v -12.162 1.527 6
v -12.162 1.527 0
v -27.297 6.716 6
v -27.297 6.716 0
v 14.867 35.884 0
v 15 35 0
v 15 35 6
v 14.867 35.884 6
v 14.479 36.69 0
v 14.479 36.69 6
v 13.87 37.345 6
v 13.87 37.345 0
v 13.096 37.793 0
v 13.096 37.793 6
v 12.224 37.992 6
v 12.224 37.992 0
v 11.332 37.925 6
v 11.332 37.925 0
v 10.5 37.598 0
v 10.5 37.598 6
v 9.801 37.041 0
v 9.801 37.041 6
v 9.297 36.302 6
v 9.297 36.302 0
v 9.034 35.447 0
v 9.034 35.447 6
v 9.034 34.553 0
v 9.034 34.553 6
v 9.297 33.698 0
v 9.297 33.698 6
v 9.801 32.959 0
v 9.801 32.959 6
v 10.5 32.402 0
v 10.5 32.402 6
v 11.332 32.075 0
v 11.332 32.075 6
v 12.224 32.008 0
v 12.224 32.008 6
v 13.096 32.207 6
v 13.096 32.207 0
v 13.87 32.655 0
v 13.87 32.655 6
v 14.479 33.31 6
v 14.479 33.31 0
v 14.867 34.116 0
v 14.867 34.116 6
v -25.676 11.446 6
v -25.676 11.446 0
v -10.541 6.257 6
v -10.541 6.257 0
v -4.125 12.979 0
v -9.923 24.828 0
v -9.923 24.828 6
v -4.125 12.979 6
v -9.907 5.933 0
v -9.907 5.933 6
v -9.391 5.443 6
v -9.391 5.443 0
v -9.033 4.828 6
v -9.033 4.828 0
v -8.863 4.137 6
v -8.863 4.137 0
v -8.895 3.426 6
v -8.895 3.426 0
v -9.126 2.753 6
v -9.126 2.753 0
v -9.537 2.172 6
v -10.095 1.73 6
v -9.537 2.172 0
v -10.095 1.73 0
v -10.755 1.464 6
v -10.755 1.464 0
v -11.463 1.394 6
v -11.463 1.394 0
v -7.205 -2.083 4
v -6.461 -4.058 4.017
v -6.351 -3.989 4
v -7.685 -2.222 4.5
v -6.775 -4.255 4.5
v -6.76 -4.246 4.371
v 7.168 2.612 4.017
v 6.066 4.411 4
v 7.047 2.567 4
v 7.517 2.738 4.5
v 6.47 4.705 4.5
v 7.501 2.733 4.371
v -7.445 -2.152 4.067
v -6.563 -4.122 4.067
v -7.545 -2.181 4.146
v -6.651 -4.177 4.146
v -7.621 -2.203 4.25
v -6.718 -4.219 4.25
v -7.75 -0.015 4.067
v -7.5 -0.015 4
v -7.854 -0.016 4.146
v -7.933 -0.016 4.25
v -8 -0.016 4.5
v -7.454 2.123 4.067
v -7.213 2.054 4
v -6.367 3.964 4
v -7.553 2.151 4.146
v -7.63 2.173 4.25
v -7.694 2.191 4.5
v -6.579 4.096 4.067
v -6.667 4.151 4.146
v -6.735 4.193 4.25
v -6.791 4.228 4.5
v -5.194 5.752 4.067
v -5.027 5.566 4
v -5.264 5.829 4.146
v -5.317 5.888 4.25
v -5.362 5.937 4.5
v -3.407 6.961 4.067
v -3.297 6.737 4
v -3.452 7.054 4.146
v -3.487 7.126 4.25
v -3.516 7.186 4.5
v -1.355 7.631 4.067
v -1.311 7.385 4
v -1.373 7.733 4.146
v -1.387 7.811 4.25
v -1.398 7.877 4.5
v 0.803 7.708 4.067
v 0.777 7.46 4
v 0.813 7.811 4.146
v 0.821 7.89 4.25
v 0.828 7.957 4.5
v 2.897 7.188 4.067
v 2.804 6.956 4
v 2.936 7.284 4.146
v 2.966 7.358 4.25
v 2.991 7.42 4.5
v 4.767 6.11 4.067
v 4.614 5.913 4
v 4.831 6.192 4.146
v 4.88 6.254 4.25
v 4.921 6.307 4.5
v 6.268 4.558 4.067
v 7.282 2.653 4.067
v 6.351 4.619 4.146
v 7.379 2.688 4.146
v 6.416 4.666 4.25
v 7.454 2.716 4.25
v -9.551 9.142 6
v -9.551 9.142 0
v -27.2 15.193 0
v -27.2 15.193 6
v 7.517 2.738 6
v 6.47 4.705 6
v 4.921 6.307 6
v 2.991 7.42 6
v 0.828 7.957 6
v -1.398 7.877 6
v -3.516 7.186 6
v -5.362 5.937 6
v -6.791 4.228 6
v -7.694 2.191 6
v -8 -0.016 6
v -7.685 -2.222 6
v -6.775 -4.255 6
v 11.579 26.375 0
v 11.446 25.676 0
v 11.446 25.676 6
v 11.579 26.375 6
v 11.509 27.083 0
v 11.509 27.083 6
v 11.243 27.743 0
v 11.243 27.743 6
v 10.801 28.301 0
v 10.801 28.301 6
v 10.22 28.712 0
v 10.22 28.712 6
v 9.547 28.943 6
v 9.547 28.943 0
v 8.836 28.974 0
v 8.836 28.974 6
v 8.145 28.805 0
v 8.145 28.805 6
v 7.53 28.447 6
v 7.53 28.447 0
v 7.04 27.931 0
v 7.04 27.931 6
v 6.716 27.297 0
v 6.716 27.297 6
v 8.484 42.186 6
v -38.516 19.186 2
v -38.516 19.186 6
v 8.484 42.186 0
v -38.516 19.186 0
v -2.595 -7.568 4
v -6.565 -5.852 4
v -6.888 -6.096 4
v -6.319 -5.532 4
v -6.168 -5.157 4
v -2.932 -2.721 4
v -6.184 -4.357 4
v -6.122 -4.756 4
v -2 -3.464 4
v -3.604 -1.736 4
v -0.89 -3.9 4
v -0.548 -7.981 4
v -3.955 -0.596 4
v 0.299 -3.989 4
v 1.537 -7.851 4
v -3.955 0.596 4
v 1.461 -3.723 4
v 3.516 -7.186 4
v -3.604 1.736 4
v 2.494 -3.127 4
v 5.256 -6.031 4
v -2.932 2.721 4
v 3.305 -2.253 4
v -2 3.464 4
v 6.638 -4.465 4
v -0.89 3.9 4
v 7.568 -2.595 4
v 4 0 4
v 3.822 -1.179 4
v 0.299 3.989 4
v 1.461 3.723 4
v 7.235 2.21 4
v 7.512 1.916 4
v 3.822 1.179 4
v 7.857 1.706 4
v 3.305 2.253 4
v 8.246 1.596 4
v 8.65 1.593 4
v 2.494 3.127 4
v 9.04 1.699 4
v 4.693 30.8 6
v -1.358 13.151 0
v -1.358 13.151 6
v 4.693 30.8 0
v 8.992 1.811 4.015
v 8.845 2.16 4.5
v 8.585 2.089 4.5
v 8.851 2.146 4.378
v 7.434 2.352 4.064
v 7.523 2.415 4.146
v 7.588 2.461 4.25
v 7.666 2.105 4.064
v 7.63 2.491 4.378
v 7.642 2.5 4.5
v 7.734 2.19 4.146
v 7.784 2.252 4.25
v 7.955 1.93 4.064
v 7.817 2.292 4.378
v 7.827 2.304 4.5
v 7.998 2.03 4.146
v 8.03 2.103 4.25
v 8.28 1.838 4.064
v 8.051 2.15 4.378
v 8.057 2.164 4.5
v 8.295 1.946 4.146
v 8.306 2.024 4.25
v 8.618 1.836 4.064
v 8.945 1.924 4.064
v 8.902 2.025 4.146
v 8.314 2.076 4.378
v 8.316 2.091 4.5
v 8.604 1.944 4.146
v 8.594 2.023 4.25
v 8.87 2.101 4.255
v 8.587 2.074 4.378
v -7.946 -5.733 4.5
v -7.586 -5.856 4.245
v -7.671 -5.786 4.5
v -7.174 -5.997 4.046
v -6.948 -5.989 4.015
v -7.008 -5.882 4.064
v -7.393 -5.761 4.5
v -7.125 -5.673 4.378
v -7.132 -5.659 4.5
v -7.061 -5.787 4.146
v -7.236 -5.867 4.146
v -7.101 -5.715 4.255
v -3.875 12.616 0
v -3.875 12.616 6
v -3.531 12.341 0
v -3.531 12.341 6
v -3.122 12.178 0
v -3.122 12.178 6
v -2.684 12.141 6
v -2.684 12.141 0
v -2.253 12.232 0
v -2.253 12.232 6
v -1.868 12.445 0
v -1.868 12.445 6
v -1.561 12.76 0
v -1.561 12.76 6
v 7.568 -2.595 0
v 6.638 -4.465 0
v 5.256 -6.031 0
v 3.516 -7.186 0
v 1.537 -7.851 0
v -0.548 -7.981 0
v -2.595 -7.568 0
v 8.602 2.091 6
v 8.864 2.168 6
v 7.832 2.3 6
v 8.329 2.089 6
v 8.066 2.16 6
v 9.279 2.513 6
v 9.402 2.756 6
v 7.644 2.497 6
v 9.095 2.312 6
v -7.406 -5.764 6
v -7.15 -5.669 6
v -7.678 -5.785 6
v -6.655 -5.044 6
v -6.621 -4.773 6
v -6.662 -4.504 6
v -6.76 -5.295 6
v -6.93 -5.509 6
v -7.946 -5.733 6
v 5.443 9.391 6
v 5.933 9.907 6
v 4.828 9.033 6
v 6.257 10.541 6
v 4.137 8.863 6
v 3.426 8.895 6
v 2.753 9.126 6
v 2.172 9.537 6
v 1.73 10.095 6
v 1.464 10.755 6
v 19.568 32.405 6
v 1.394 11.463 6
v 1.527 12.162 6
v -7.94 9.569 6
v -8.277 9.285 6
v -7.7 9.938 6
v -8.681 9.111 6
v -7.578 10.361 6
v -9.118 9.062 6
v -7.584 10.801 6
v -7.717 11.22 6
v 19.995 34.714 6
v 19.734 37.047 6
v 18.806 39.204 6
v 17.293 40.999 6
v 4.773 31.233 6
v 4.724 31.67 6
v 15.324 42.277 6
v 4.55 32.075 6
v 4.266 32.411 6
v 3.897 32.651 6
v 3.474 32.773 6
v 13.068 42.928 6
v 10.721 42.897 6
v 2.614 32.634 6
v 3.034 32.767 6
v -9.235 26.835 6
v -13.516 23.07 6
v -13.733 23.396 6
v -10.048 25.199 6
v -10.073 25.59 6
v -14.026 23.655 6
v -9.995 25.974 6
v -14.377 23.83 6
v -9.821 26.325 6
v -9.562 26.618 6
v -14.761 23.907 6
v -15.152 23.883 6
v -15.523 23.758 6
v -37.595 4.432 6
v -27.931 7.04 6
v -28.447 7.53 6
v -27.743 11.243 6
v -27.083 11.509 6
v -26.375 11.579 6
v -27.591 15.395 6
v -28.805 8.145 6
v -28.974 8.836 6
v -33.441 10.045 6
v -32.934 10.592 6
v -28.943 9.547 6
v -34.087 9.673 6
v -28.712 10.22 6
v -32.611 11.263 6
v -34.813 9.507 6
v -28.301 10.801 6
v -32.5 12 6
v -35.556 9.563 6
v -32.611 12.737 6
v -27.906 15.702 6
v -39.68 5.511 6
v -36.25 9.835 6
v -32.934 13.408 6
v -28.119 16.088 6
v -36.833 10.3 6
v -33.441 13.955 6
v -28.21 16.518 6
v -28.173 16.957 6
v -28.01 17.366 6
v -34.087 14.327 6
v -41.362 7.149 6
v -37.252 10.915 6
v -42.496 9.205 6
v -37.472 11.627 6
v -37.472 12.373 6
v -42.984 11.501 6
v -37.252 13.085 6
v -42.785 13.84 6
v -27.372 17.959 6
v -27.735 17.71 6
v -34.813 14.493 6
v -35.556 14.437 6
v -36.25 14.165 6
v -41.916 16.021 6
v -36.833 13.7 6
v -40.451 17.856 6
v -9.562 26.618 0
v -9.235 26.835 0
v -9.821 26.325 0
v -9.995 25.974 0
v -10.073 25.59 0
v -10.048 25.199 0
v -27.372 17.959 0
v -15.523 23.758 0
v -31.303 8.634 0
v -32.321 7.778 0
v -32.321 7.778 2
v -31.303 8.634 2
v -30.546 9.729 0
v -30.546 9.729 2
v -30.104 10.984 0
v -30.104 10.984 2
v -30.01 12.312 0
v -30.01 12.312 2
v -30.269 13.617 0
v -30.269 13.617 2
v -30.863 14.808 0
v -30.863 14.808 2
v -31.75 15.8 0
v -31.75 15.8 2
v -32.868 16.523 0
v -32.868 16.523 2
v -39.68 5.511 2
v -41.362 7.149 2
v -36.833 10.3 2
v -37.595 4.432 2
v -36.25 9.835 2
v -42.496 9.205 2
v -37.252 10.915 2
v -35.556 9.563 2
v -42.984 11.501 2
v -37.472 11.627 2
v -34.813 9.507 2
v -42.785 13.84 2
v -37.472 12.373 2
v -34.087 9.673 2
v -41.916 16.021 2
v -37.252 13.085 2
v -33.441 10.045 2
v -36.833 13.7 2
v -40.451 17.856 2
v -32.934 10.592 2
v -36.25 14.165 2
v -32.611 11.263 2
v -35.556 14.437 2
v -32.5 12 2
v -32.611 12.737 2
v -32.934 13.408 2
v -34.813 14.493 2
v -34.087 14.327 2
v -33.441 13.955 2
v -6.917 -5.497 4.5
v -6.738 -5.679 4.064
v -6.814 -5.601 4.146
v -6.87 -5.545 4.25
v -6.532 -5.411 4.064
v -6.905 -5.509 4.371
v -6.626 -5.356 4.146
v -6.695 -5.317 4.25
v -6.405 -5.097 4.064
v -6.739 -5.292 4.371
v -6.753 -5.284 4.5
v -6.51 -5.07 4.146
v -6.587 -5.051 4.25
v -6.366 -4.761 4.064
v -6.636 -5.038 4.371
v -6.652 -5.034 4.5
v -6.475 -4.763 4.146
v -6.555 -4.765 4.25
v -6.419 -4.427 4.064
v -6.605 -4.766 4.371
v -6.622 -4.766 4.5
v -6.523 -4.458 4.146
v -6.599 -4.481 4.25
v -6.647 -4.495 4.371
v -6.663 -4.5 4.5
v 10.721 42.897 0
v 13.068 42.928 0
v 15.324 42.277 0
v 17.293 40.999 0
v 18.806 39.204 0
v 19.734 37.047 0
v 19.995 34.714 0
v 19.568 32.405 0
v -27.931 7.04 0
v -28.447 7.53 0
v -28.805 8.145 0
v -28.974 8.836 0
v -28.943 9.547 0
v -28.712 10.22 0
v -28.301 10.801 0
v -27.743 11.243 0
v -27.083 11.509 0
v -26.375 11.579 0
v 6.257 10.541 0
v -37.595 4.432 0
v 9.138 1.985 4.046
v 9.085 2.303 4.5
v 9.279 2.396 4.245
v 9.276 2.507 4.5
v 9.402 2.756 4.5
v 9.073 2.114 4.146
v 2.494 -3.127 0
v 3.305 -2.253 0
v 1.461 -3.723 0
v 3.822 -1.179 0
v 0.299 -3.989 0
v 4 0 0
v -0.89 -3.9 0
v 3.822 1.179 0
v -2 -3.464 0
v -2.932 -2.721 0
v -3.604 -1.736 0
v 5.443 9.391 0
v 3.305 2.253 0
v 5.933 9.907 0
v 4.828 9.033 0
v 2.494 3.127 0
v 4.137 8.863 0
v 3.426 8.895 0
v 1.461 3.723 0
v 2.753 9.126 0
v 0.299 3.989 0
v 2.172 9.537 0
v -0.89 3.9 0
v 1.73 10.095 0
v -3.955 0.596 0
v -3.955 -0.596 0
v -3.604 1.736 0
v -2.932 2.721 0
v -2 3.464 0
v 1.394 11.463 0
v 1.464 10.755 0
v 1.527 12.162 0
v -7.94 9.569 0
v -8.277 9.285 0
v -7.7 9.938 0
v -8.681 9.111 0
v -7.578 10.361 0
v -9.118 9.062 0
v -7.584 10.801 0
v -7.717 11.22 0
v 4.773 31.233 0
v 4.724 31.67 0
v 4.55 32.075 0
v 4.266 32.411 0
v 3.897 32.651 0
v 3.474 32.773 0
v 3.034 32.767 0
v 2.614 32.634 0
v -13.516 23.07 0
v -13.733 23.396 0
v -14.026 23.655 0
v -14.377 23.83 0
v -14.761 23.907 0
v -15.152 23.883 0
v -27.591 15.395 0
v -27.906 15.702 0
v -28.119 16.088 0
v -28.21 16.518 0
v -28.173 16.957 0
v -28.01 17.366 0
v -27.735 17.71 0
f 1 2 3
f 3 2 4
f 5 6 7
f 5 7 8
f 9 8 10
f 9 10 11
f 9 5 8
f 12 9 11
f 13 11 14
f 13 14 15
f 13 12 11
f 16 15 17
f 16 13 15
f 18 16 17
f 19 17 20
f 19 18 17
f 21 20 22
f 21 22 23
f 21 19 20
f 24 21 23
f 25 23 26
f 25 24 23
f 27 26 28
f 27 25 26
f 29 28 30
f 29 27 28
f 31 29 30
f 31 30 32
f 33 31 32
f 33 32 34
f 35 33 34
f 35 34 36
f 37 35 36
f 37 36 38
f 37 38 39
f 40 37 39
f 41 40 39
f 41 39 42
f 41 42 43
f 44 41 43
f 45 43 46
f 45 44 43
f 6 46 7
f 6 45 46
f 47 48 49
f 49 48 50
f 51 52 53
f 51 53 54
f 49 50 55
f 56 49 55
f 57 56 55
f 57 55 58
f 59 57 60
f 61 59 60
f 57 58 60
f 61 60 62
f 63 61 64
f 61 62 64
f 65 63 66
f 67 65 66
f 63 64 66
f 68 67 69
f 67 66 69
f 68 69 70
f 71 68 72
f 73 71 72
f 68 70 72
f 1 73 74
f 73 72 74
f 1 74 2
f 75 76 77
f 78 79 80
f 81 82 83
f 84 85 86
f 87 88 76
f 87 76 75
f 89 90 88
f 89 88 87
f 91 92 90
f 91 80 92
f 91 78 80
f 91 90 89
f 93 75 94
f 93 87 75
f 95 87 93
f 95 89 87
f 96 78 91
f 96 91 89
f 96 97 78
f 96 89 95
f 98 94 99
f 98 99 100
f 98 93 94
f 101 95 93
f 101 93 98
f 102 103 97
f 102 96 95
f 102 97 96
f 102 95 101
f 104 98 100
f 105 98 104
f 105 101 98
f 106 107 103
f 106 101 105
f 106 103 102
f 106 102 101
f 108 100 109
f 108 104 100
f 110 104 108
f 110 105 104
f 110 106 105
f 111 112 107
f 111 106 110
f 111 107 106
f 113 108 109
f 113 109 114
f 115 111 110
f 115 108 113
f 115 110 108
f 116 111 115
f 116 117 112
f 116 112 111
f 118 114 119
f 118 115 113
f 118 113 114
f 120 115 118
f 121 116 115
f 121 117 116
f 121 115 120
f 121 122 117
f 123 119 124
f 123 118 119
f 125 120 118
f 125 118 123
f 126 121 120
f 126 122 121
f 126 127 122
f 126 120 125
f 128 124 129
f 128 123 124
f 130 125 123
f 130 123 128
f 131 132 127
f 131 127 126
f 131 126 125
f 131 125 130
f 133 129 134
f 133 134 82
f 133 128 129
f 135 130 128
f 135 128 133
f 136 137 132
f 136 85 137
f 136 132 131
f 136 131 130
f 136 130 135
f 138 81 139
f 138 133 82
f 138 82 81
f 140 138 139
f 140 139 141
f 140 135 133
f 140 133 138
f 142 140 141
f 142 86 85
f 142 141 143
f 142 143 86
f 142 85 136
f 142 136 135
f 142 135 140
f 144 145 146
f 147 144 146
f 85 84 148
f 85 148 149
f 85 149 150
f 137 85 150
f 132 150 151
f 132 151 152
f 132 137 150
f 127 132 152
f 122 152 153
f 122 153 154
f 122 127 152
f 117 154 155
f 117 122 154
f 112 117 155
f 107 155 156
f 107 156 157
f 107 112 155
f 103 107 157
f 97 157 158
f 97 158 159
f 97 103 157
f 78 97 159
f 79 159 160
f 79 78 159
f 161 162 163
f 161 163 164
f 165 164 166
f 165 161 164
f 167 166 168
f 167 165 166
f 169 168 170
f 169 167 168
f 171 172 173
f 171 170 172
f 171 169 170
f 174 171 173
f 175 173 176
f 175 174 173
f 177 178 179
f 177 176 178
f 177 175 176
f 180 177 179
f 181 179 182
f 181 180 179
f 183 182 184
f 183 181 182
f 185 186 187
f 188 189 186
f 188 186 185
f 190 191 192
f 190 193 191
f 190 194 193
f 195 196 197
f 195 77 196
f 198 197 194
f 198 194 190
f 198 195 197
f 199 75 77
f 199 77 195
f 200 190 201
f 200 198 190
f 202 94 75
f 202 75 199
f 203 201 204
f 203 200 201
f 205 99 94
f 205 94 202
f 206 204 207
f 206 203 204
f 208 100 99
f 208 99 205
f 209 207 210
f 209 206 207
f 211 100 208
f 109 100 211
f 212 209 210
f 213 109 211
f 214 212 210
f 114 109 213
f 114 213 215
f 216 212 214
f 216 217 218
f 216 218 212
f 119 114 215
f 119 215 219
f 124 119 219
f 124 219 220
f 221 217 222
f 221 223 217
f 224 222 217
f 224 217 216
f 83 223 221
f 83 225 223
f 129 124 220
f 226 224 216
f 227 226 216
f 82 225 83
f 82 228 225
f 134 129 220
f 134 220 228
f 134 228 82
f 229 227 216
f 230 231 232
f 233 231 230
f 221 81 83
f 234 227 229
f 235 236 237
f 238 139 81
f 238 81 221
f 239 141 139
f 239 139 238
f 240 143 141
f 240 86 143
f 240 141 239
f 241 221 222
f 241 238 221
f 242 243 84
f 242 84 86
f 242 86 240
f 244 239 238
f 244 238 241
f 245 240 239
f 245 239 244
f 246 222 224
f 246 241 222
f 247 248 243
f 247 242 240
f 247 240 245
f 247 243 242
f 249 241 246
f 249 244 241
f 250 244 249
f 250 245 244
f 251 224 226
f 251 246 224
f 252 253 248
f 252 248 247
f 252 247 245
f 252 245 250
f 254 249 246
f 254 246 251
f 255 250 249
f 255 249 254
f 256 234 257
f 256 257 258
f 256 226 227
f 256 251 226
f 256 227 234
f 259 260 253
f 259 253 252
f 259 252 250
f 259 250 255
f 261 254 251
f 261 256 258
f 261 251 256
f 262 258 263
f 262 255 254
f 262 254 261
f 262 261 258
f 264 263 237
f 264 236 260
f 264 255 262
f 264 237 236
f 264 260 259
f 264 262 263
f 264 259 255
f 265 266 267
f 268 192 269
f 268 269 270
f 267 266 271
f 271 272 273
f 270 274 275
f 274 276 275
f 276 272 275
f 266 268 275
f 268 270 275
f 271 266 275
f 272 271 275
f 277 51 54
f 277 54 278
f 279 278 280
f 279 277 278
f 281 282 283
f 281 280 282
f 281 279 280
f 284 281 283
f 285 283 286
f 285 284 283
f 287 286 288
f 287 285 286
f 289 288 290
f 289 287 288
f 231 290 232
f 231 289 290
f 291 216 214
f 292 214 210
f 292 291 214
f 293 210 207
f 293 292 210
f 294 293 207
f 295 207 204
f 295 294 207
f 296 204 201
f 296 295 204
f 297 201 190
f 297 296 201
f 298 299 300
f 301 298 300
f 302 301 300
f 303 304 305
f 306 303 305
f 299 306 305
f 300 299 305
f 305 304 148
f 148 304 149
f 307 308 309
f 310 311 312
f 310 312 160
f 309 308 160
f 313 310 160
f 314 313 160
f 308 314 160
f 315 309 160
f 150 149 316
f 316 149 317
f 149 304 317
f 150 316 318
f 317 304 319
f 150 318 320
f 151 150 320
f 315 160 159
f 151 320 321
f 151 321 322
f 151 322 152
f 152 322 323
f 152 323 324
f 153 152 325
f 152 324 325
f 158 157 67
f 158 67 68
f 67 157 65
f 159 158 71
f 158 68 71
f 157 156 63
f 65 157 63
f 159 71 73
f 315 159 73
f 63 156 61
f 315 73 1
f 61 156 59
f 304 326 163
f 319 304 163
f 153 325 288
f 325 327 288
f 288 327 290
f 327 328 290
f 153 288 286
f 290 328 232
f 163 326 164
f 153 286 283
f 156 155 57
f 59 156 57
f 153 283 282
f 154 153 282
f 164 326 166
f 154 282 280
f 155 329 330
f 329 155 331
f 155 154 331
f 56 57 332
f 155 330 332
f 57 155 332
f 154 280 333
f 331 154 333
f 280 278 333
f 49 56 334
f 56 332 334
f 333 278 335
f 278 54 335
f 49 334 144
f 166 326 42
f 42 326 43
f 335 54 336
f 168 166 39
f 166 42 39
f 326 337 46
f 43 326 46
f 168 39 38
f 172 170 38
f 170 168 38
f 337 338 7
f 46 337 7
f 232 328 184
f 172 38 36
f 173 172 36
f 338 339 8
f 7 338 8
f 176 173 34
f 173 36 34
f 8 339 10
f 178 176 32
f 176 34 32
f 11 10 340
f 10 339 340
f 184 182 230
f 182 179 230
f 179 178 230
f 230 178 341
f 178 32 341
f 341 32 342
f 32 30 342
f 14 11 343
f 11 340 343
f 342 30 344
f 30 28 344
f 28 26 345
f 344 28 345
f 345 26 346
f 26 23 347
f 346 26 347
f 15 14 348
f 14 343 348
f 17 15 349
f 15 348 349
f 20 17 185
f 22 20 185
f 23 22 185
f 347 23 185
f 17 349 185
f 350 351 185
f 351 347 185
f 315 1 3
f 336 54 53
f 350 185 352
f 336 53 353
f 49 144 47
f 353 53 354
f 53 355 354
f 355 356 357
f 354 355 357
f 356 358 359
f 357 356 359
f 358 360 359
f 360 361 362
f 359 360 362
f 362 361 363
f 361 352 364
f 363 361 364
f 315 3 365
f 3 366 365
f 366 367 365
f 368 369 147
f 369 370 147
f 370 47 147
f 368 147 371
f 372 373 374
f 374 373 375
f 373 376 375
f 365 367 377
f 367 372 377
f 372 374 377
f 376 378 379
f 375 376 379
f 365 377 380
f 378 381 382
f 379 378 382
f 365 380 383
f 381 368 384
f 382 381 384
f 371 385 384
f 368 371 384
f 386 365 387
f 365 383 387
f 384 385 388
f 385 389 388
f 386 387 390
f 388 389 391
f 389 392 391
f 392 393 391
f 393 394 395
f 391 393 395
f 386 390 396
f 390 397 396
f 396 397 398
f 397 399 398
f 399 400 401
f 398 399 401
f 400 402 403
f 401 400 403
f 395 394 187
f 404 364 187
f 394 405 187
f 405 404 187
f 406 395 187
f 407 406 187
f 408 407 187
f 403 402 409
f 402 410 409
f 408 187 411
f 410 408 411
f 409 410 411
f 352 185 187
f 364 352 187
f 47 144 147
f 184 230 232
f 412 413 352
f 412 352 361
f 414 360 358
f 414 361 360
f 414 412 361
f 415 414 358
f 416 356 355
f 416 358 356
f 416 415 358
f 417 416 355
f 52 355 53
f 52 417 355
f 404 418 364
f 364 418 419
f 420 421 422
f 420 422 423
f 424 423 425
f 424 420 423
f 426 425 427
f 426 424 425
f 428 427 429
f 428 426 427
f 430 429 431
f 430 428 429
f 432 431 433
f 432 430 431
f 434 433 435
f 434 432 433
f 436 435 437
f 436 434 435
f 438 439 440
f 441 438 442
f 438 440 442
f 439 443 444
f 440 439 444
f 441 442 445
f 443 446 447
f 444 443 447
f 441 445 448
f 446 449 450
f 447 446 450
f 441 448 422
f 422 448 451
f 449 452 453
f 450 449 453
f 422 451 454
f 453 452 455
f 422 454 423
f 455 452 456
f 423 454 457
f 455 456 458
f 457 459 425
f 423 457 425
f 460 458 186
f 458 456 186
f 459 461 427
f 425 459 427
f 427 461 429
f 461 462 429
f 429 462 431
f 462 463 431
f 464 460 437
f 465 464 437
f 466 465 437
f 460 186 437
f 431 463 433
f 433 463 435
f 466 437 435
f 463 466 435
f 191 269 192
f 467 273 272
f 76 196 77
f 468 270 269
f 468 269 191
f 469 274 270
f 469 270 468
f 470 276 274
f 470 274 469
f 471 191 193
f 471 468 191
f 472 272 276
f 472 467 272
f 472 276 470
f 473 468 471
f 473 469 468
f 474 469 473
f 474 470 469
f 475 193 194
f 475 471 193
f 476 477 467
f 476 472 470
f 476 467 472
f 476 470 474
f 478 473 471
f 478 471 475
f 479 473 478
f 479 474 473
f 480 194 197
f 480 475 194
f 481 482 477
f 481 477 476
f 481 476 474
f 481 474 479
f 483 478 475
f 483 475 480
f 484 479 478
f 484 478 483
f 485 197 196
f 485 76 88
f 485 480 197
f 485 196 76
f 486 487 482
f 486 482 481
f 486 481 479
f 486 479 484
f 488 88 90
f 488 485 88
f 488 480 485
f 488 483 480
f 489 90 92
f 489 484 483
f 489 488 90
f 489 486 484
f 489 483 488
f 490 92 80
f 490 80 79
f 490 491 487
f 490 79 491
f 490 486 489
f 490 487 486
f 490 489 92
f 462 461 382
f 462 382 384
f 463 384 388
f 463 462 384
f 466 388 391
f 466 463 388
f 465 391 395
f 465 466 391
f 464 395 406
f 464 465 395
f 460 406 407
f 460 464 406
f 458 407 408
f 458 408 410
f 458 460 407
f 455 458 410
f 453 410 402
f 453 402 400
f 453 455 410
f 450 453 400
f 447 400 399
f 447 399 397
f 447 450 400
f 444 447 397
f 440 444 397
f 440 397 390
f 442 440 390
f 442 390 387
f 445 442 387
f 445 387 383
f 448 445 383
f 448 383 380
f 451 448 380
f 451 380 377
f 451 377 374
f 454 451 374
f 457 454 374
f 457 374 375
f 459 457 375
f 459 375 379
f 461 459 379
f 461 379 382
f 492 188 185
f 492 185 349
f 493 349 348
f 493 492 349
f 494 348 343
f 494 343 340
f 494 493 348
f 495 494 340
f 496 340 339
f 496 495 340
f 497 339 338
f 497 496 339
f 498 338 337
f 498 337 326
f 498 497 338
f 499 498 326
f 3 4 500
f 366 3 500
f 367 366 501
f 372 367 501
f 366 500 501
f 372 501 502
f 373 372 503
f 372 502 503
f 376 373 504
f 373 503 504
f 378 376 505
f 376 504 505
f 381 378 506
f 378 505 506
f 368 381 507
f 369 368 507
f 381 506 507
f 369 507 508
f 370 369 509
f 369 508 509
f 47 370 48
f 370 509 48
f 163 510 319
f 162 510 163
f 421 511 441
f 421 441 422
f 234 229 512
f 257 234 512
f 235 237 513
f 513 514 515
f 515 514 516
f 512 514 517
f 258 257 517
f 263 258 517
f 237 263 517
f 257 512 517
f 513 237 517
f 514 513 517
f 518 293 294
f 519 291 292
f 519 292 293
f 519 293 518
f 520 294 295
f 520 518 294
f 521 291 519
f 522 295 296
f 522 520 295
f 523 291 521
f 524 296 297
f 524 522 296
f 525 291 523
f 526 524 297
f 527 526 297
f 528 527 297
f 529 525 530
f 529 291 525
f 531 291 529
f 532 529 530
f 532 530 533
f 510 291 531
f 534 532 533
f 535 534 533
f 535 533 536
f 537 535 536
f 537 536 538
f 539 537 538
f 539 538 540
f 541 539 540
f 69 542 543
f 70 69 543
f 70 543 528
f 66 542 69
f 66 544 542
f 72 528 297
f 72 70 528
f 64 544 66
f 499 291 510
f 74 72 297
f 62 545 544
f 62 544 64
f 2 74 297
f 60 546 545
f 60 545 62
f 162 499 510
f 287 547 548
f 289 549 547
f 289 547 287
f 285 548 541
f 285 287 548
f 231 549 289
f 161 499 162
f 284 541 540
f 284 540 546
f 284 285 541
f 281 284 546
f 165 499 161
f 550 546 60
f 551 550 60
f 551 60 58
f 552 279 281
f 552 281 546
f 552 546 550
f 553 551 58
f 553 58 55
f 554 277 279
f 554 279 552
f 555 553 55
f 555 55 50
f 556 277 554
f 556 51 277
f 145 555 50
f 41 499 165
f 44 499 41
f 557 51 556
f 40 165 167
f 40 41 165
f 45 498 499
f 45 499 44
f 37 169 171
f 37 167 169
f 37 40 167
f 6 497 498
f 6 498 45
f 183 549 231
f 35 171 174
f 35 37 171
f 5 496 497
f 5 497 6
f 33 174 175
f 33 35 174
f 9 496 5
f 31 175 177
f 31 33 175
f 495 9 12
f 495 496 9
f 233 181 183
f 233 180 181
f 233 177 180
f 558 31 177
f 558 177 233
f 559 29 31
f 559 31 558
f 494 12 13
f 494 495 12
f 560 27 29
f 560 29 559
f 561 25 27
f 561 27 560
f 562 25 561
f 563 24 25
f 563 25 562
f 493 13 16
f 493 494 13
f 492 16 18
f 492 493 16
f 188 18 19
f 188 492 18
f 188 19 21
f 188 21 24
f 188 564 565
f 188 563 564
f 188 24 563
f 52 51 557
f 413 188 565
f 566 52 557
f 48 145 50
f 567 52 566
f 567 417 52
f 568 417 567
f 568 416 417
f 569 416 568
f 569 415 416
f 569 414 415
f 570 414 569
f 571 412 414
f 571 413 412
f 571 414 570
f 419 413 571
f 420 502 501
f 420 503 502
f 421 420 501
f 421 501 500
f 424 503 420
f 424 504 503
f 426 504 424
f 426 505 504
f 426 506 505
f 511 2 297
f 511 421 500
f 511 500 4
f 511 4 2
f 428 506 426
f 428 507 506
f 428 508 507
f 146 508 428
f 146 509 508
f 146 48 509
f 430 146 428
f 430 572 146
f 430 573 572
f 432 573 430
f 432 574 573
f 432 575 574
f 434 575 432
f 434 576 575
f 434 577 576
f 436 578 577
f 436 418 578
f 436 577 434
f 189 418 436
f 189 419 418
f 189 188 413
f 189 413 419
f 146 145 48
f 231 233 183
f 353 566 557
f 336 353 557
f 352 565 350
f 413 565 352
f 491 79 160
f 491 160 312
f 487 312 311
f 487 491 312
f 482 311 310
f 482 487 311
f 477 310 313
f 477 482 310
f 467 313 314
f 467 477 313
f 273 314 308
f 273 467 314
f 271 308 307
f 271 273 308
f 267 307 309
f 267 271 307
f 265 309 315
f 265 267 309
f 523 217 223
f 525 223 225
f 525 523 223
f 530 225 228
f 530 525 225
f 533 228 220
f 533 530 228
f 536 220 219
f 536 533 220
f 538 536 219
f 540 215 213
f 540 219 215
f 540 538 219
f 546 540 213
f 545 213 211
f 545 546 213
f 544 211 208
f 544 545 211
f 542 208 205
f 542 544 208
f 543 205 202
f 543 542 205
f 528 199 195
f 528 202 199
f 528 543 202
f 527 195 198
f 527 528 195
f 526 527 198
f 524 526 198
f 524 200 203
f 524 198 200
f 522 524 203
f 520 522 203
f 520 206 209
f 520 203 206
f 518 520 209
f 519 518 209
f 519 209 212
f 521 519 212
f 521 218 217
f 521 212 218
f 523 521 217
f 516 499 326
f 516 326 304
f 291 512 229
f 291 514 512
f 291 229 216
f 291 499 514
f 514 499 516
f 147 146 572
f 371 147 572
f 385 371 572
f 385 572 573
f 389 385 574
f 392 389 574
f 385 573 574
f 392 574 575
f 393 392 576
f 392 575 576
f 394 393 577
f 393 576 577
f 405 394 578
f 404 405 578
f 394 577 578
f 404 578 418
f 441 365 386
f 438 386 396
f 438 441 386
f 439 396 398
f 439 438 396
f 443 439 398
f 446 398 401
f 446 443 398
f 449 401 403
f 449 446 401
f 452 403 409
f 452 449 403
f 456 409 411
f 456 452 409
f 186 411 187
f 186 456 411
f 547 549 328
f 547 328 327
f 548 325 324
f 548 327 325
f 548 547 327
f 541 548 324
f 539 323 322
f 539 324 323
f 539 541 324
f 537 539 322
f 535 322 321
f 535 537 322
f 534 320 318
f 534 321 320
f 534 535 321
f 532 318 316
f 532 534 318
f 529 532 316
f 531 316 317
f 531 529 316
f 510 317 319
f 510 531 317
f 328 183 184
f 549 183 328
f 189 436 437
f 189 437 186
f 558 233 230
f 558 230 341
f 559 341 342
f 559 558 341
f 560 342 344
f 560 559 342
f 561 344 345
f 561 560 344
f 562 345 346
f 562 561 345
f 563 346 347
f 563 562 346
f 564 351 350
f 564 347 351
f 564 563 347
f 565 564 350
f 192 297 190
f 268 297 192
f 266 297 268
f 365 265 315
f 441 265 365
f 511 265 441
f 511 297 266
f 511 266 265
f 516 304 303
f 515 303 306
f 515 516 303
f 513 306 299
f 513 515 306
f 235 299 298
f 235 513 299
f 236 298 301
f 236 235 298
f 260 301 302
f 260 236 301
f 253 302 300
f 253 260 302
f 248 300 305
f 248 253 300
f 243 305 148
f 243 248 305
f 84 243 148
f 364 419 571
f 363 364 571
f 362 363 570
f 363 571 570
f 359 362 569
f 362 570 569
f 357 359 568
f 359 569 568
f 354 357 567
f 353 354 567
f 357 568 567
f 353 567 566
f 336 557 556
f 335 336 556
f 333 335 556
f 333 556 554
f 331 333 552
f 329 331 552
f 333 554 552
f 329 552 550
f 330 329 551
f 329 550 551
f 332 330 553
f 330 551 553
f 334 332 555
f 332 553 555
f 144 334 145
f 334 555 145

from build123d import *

# Parameters (mm, degrees)
SKETCH1_R               = 2.5
SKETCH1_R_2             = 4
SKETCH1_R_3             = 3
BOSS_EXTRUDE1_DEPTH     = 6
CUT_EXTRUDE1_DEPTH      = 62.10646447
CUT_EXTRUDE1_DEPTH_BACK = 62.10646447
CUT_EXTRUDE2_START      = -2
SKETCH4_R               = 8
CUT_EXTRUDE2_DEPTH      = 2
FILLET1_START           = 4
FILLET1_DEPTH           = 2
FILLET2_R               = 0.5
CUT_EXTRUDE3_DEPTH      = 2


with BuildPart() as part:
    # Sketch1 → Boss-Extrude1 (new body)
    with BuildSketch(Plane.XY):
        with BuildLine():
            Line((19.567567568, 32.405405405), (7.567567568, -2.594594595))
            ThreePointArc((7.567567568, -2.594594595), (3.516422912, -7.185733776), (-2.594594595, -7.567567568))
            Line((-2.594594595, -7.567567568), (-37.594594595, 4.432432432))
            ThreePointArc((-37.594594595, 4.432432432), (-42.984429152, 11.50111011), (-38.516422912, 19.185733776))
            Line((-38.516422912, 19.185733776), (8.483577088, 42.185733776))
            ThreePointArc((8.483577088, 42.185733776), (17.293075573, 40.998612422), (19.567567568, 32.405405405))
        make_face()
        with Locations((-35, 12)):
            Circle(SKETCH1_R, mode=Mode.SUBTRACT)
        Circle(SKETCH1_R_2, mode=Mode.SUBTRACT)
        with Locations((12, 35)):
            Circle(SKETCH1_R_3, mode=Mode.SUBTRACT)
    extrude(amount=BOSS_EXTRUDE1_DEPTH)

    # Sketch2 → Cut-Extrude1 (cut, two sides: drawn at the far end of the back side and taken through both)
    with BuildSketch(Plane.XY.offset(6).offset(-CUT_EXTRUDE1_DEPTH_BACK)):
        with BuildLine():
            Line((-27.3724879, 17.959246424), (-15.522864255, 23.75799842))
            ThreePointArc((-15.522864255, 23.75799842), (-14.377048473, 23.829592256), (-13.516209876, 23.070002633))
            Line((-13.516209876, 23.070002633), (-7.71745788, 11.220378988))
            ThreePointArc((-7.71745788, 11.220378988), (-7.940043134, 9.568598022), (-9.551269449, 9.142130773))
            Line((-9.551269449, 9.142130773), (-27.199645091, 15.193002422))
            ThreePointArc((-27.199645091, 15.193002422), (-28.21023907, 16.518379486), (-27.3724879, 17.959246424))
        make_face()
        with BuildLine():
            Line((-25.675675676, 11.445945946), (-10.540540541, 6.256756757))
            ThreePointArc((-10.540540541, 6.256756757), (-8.986486486, 3.081081081), (-12.162162162, 1.527027027))
            Line((-12.162162162, 1.527027027), (-27.297297297, 6.716216216))
            ThreePointArc((-27.297297297, 6.716216216), (-28.851351351, 9.891891892), (-25.675675676, 11.445945946))
        make_face()
        with BuildLine():
            Line((-9.923342988, 24.828214089), (-4.124590991, 12.978590444))
            ThreePointArc((-4.124590991, 12.978590444), (-2.683724054, 12.140839274), (-1.358346989, 13.151433254))
            Line((-1.358346989, 13.151433254), (4.692524659, 30.799808895))
            ThreePointArc((4.692524659, 30.799808895), (4.26605741, 32.41103521), (2.614276444, 32.633620464))
            Line((2.614276444, 32.633620464), (-9.235347201, 26.834868468))
            ThreePointArc((-9.235347201, 26.834868468), (-9.994936824, 25.974029871), (-9.923342988, 24.828214089))
        make_face()
        with BuildLine():
            Line((6.716216216, 27.297297297), (1.527027027, 12.162162162))
            ThreePointArc((1.527027027, 12.162162162), (3.081081081, 8.986486486), (6.256756757, 10.540540541))
            Line((6.256756757, 10.540540541), (11.445945946, 25.675675676))
            ThreePointArc((11.445945946, 25.675675676), (9.891891892, 28.851351351), (6.716216216, 27.297297297))
        make_face()
    extrude(amount=CUT_EXTRUDE1_DEPTH + CUT_EXTRUDE1_DEPTH_BACK, mode=Mode.SUBTRACT)

    # Sketch4 → Cut-Extrude2 (cut)
    with BuildSketch(Plane.XY.offset(6).offset(CUT_EXTRUDE2_START)):
        Circle(SKETCH4_R)
    extrude(amount=CUT_EXTRUDE2_DEPTH, mode=Mode.SUBTRACT)

    # Fillet1: read off the stored shape, not the designer's step
    # Fillet1 outline → Fillet1 (cut)
    with BuildSketch(Plane.XY.offset(FILLET1_START)):
        with BuildLine():
            ThreePointArc((9.402223, 2.75648375), (8.465816464, 2.080853575), (7.516690715, 2.738496066))
            ThreePointArc((7.516690715, 2.738496066), (7.999635991, 0.076315279), (7.567567568, -2.594594595))
            Line((7.567567568, -2.594594595), (9.402223, 2.75648375))
        make_face()
        with BuildLine():
            ThreePointArc((-2.594594595, -7.567567568), (-4.968729766, -6.269906261), (-6.774532102, -4.255081057))
            ThreePointArc((-6.774532102, -4.255081057), (-6.837610332, -5.40805741), (-7.945672939, -5.732912135))
            Line((-7.945672939, -5.732912135), (-2.594594595, -7.567567568))
        make_face()
    extrude(amount=FILLET1_DEPTH, mode=Mode.SUBTRACT)

    # Fillet2
    fillet2_edges = [part.edges().sort_by_distance(p)[0] for p in [
        (-3.516422912, 7.185733776, 4),
        (8.465816464, 2.080853575, 4),
        (-6.837610332, -5.40805741, 4),
    ]]
    fillet(fillet2_edges, radius=FILLET2_R)

    # Sketch5 → Cut-Extrude3 (cut)
    with BuildSketch(Plane(origin=(0, 0, 0), x_dir=(-1, 0, 0), z_dir=(0, 0, -1))):
        with BuildLine():
            Line((37.594594595, 4.432432432), (32.321369427, 7.778040946))
            ThreePointArc((32.321369427, 7.778040946), (30.00973178, 12.311806181), (32.86775168, 16.522556479))
            Line((32.86775168, 16.522556479), (38.516422912, 19.185733776))
            ThreePointArc((38.516422912, 19.185733776), (42.984429152, 11.50111011), (37.594594595, 4.432432432))
        make_face()
    extrude(amount=-CUT_EXTRUDE3_DEPTH, mode=Mode.SUBTRACT)


solid = part.part
